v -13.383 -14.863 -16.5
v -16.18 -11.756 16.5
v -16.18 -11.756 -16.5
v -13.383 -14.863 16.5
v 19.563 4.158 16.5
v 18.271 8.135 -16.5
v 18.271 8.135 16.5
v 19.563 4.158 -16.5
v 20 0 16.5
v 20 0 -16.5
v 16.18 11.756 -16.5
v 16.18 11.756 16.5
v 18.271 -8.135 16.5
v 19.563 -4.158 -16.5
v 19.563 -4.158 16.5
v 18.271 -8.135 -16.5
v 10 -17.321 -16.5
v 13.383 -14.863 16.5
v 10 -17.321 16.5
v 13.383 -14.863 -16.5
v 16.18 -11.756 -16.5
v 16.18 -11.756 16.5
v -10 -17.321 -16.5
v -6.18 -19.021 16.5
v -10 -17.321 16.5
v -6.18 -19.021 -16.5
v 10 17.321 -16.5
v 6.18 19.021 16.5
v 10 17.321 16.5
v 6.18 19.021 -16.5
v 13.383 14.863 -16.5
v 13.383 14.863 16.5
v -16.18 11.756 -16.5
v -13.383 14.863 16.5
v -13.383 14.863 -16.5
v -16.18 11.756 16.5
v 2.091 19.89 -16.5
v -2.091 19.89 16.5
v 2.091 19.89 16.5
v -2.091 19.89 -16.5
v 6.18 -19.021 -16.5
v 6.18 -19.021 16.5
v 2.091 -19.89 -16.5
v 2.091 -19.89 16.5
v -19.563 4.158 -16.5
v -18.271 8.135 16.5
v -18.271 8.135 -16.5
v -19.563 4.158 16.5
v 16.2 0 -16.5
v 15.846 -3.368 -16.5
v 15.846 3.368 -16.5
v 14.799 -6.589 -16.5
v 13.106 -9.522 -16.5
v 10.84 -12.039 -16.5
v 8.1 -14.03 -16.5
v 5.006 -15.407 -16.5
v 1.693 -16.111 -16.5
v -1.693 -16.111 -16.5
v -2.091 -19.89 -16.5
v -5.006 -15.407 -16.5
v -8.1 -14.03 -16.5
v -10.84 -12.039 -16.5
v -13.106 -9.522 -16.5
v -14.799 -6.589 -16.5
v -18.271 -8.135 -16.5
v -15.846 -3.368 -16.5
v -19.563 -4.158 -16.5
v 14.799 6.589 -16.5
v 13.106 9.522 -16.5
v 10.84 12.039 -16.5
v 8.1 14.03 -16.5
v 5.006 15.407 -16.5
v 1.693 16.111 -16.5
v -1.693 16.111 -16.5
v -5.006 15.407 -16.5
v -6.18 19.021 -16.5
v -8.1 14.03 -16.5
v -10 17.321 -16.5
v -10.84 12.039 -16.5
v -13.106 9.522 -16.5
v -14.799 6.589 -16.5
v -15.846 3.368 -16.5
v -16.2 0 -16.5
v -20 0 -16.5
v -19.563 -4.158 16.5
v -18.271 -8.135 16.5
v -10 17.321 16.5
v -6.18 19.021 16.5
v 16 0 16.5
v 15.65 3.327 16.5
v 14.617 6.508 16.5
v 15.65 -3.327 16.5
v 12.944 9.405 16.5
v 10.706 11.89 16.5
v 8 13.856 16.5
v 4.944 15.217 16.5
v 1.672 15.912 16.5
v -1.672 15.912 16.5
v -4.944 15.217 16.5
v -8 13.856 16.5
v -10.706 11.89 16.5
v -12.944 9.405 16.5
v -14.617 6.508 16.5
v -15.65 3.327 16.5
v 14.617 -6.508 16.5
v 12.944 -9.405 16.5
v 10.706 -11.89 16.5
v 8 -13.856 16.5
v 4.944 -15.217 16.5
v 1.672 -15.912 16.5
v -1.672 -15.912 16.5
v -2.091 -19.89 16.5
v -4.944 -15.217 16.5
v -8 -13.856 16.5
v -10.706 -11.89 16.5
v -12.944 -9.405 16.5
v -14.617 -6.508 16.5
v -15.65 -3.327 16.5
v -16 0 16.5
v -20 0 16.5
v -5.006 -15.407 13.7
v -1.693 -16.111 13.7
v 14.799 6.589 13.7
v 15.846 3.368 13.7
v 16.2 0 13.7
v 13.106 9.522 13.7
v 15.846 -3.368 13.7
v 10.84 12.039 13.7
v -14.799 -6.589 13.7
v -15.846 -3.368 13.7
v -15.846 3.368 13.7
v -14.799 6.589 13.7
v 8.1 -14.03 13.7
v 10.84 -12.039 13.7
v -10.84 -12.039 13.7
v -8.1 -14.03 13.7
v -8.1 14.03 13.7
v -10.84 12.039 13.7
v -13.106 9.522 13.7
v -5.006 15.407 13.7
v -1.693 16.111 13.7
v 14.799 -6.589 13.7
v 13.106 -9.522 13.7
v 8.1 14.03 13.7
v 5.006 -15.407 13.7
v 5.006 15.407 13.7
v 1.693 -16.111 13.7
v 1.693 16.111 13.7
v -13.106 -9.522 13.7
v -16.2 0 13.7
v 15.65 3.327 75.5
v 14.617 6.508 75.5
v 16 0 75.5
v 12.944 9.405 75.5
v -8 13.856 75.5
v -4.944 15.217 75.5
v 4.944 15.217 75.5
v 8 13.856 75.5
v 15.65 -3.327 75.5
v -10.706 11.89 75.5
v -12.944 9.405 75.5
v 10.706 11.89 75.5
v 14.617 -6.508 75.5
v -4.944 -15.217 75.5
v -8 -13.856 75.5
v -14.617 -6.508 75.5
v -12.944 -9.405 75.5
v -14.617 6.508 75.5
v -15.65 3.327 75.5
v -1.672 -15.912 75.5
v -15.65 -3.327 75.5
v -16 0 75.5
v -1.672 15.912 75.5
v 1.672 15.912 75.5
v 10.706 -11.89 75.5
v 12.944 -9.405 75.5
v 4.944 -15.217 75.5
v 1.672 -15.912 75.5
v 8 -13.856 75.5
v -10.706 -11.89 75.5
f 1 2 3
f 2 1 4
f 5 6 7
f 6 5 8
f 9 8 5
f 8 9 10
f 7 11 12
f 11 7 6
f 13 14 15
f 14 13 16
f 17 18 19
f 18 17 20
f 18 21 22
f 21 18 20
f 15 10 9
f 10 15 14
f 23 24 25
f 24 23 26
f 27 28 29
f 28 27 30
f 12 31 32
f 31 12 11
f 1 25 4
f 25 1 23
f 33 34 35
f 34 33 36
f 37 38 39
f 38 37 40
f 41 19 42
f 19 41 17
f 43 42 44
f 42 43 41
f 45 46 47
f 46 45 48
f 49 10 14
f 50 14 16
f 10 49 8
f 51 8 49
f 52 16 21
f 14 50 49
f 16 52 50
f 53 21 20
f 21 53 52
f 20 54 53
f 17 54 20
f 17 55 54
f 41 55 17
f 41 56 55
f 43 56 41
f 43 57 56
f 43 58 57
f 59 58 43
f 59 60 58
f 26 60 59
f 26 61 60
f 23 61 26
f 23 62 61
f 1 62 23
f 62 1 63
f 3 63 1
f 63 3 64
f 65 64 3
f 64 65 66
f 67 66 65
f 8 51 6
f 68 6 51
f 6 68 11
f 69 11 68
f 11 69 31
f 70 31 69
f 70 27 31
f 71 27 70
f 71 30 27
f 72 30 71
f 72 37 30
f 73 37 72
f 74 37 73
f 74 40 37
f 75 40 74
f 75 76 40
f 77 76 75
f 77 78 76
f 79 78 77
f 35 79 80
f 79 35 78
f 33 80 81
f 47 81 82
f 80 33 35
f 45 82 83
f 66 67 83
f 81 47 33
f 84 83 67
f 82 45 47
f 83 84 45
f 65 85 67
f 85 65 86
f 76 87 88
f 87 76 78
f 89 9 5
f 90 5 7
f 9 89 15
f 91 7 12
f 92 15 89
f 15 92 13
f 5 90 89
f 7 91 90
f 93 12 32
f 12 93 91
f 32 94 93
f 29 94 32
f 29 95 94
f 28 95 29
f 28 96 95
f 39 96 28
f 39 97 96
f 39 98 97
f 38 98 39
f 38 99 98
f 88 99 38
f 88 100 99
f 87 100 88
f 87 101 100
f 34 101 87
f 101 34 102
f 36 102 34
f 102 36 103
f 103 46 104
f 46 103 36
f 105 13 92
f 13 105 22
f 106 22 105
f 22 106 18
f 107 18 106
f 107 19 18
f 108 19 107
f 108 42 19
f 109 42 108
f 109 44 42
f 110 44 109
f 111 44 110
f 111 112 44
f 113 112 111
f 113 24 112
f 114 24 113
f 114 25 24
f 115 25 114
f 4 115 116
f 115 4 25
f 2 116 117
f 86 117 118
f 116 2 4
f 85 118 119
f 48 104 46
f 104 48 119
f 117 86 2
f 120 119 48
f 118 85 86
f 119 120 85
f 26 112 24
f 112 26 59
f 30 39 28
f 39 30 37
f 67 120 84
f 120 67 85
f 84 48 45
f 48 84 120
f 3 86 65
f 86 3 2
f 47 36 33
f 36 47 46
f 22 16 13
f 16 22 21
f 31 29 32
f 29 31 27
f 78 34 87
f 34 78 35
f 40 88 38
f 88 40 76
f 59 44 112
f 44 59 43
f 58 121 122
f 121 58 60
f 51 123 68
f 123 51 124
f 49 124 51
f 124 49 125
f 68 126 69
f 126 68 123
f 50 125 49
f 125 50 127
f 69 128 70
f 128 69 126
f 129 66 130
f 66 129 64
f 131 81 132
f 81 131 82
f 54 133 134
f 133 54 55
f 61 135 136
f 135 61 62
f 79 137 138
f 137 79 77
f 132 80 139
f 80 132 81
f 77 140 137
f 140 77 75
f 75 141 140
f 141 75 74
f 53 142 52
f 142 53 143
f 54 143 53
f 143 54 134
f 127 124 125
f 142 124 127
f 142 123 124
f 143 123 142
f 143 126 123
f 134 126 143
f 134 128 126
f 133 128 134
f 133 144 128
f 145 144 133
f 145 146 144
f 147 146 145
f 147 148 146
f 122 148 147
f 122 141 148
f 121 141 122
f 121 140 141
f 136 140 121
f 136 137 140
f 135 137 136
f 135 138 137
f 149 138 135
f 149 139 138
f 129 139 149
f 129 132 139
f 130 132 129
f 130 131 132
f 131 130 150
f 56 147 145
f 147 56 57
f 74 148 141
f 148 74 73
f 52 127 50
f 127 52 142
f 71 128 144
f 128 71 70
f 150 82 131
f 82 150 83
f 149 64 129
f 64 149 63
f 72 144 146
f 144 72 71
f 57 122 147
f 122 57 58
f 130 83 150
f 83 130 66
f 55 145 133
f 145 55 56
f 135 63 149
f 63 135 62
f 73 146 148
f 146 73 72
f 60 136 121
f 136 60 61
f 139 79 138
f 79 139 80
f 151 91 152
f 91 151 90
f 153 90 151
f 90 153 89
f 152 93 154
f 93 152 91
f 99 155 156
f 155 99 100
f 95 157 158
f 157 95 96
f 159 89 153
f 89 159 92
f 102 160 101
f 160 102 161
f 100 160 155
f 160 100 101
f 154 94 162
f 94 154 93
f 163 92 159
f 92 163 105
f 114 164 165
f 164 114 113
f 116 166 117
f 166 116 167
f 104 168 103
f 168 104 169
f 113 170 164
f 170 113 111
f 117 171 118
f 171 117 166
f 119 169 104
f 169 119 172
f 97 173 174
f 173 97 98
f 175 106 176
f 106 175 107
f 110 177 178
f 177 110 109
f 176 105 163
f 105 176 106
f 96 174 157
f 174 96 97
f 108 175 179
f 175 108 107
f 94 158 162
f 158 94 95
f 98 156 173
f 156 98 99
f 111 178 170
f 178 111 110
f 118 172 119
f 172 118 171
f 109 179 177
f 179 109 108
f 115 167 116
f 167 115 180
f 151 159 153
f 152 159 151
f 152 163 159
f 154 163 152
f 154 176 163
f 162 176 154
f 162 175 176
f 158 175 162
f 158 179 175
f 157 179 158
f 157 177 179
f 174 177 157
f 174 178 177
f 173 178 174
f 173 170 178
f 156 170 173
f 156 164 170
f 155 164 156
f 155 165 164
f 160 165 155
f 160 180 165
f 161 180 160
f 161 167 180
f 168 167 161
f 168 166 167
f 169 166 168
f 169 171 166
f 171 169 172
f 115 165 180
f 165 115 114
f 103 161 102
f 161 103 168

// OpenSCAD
// Parameters
pipe_outer_diameter_mm = 32; //[16:64:0.1]
cap_outer_diameter_mm = 40; //[20:80:0.1]
socket_inner_diameter_mm = 32.4; //[16.2:64.8:0.1]
socket_depth_mm = 30; //[15:60:0.1]
wall_thickness_mm = 2.5; //[1.25:5:0.1]
end_thickness_mm = 3; //[1.5:6:0.1]
internal_stop_offset_mm = 28; //[14:56:0.1]
fillet_radius_mm = 1; //[0.5:2:0.1]
pipe_wall_thickness_mm = 2.0; //[1.0:4.0:0.1]
pipe_stub_length_mm = 60; //[30:120:0.1]
overlap_mm = 1; //[0.5:2:0.1]
eps_mm = 0.2; //[0.05:0.5:0.05]

// HT Pipe - complete geometry
module ht_pipe() {
  color([0.85, 0.85, 0.8]) {
    // Outer pipe
    cylinder(r=pipe_outer_diameter_mm/2, h=pipe_stub_length_mm, center=true);
    // Inner pipe
    translate([0, 0, -eps_mm/2])
      cylinder(r=(pipe_outer_diameter_mm/2) - pipe_wall_thickness_mm, h=pipe_stub_length_mm + eps_mm, center=true);
  }
}

// Cap with pipe assembly
module cap_with_pipe() {
  color([0.85, 0.85, 0.8]) {
    // Cap body
    difference() {
      cylinder(r=cap_outer_diameter_mm/2, h=socket_depth_mm + end_thickness_mm, center=true);
      translate([0, 0, (socket_depth_mm + eps_mm)/2 - (socket_depth_mm + end_thickness_mm)/2])
        cylinder(r=socket_inner_diameter_mm/2, h=socket_depth_mm + eps_mm, center=true);
      translate([0, 0, (- (socket_depth_mm + end_thickness_mm)/2) + internal_stop_offset_mm + (socket_depth_mm - internal_stop_offset_mm + eps_mm)/2])
        cylinder(r=(socket_inner_diameter_mm/2) - wall_thickness_mm, h=socket_depth_mm - internal_stop_offset_mm + eps_mm, center=true);
    }
    // Fillet (omitted due to performance)
  }
  // Pipe stub
  translate([0, 0, (socket_depth_mm + end_thickness_mm)/2 + pipe_stub_length_mm/2 - overlap_mm])
    ht_pipe();
}

// Final assembly
module assembly() {
  cap_with_pipe();
}

assembly();
